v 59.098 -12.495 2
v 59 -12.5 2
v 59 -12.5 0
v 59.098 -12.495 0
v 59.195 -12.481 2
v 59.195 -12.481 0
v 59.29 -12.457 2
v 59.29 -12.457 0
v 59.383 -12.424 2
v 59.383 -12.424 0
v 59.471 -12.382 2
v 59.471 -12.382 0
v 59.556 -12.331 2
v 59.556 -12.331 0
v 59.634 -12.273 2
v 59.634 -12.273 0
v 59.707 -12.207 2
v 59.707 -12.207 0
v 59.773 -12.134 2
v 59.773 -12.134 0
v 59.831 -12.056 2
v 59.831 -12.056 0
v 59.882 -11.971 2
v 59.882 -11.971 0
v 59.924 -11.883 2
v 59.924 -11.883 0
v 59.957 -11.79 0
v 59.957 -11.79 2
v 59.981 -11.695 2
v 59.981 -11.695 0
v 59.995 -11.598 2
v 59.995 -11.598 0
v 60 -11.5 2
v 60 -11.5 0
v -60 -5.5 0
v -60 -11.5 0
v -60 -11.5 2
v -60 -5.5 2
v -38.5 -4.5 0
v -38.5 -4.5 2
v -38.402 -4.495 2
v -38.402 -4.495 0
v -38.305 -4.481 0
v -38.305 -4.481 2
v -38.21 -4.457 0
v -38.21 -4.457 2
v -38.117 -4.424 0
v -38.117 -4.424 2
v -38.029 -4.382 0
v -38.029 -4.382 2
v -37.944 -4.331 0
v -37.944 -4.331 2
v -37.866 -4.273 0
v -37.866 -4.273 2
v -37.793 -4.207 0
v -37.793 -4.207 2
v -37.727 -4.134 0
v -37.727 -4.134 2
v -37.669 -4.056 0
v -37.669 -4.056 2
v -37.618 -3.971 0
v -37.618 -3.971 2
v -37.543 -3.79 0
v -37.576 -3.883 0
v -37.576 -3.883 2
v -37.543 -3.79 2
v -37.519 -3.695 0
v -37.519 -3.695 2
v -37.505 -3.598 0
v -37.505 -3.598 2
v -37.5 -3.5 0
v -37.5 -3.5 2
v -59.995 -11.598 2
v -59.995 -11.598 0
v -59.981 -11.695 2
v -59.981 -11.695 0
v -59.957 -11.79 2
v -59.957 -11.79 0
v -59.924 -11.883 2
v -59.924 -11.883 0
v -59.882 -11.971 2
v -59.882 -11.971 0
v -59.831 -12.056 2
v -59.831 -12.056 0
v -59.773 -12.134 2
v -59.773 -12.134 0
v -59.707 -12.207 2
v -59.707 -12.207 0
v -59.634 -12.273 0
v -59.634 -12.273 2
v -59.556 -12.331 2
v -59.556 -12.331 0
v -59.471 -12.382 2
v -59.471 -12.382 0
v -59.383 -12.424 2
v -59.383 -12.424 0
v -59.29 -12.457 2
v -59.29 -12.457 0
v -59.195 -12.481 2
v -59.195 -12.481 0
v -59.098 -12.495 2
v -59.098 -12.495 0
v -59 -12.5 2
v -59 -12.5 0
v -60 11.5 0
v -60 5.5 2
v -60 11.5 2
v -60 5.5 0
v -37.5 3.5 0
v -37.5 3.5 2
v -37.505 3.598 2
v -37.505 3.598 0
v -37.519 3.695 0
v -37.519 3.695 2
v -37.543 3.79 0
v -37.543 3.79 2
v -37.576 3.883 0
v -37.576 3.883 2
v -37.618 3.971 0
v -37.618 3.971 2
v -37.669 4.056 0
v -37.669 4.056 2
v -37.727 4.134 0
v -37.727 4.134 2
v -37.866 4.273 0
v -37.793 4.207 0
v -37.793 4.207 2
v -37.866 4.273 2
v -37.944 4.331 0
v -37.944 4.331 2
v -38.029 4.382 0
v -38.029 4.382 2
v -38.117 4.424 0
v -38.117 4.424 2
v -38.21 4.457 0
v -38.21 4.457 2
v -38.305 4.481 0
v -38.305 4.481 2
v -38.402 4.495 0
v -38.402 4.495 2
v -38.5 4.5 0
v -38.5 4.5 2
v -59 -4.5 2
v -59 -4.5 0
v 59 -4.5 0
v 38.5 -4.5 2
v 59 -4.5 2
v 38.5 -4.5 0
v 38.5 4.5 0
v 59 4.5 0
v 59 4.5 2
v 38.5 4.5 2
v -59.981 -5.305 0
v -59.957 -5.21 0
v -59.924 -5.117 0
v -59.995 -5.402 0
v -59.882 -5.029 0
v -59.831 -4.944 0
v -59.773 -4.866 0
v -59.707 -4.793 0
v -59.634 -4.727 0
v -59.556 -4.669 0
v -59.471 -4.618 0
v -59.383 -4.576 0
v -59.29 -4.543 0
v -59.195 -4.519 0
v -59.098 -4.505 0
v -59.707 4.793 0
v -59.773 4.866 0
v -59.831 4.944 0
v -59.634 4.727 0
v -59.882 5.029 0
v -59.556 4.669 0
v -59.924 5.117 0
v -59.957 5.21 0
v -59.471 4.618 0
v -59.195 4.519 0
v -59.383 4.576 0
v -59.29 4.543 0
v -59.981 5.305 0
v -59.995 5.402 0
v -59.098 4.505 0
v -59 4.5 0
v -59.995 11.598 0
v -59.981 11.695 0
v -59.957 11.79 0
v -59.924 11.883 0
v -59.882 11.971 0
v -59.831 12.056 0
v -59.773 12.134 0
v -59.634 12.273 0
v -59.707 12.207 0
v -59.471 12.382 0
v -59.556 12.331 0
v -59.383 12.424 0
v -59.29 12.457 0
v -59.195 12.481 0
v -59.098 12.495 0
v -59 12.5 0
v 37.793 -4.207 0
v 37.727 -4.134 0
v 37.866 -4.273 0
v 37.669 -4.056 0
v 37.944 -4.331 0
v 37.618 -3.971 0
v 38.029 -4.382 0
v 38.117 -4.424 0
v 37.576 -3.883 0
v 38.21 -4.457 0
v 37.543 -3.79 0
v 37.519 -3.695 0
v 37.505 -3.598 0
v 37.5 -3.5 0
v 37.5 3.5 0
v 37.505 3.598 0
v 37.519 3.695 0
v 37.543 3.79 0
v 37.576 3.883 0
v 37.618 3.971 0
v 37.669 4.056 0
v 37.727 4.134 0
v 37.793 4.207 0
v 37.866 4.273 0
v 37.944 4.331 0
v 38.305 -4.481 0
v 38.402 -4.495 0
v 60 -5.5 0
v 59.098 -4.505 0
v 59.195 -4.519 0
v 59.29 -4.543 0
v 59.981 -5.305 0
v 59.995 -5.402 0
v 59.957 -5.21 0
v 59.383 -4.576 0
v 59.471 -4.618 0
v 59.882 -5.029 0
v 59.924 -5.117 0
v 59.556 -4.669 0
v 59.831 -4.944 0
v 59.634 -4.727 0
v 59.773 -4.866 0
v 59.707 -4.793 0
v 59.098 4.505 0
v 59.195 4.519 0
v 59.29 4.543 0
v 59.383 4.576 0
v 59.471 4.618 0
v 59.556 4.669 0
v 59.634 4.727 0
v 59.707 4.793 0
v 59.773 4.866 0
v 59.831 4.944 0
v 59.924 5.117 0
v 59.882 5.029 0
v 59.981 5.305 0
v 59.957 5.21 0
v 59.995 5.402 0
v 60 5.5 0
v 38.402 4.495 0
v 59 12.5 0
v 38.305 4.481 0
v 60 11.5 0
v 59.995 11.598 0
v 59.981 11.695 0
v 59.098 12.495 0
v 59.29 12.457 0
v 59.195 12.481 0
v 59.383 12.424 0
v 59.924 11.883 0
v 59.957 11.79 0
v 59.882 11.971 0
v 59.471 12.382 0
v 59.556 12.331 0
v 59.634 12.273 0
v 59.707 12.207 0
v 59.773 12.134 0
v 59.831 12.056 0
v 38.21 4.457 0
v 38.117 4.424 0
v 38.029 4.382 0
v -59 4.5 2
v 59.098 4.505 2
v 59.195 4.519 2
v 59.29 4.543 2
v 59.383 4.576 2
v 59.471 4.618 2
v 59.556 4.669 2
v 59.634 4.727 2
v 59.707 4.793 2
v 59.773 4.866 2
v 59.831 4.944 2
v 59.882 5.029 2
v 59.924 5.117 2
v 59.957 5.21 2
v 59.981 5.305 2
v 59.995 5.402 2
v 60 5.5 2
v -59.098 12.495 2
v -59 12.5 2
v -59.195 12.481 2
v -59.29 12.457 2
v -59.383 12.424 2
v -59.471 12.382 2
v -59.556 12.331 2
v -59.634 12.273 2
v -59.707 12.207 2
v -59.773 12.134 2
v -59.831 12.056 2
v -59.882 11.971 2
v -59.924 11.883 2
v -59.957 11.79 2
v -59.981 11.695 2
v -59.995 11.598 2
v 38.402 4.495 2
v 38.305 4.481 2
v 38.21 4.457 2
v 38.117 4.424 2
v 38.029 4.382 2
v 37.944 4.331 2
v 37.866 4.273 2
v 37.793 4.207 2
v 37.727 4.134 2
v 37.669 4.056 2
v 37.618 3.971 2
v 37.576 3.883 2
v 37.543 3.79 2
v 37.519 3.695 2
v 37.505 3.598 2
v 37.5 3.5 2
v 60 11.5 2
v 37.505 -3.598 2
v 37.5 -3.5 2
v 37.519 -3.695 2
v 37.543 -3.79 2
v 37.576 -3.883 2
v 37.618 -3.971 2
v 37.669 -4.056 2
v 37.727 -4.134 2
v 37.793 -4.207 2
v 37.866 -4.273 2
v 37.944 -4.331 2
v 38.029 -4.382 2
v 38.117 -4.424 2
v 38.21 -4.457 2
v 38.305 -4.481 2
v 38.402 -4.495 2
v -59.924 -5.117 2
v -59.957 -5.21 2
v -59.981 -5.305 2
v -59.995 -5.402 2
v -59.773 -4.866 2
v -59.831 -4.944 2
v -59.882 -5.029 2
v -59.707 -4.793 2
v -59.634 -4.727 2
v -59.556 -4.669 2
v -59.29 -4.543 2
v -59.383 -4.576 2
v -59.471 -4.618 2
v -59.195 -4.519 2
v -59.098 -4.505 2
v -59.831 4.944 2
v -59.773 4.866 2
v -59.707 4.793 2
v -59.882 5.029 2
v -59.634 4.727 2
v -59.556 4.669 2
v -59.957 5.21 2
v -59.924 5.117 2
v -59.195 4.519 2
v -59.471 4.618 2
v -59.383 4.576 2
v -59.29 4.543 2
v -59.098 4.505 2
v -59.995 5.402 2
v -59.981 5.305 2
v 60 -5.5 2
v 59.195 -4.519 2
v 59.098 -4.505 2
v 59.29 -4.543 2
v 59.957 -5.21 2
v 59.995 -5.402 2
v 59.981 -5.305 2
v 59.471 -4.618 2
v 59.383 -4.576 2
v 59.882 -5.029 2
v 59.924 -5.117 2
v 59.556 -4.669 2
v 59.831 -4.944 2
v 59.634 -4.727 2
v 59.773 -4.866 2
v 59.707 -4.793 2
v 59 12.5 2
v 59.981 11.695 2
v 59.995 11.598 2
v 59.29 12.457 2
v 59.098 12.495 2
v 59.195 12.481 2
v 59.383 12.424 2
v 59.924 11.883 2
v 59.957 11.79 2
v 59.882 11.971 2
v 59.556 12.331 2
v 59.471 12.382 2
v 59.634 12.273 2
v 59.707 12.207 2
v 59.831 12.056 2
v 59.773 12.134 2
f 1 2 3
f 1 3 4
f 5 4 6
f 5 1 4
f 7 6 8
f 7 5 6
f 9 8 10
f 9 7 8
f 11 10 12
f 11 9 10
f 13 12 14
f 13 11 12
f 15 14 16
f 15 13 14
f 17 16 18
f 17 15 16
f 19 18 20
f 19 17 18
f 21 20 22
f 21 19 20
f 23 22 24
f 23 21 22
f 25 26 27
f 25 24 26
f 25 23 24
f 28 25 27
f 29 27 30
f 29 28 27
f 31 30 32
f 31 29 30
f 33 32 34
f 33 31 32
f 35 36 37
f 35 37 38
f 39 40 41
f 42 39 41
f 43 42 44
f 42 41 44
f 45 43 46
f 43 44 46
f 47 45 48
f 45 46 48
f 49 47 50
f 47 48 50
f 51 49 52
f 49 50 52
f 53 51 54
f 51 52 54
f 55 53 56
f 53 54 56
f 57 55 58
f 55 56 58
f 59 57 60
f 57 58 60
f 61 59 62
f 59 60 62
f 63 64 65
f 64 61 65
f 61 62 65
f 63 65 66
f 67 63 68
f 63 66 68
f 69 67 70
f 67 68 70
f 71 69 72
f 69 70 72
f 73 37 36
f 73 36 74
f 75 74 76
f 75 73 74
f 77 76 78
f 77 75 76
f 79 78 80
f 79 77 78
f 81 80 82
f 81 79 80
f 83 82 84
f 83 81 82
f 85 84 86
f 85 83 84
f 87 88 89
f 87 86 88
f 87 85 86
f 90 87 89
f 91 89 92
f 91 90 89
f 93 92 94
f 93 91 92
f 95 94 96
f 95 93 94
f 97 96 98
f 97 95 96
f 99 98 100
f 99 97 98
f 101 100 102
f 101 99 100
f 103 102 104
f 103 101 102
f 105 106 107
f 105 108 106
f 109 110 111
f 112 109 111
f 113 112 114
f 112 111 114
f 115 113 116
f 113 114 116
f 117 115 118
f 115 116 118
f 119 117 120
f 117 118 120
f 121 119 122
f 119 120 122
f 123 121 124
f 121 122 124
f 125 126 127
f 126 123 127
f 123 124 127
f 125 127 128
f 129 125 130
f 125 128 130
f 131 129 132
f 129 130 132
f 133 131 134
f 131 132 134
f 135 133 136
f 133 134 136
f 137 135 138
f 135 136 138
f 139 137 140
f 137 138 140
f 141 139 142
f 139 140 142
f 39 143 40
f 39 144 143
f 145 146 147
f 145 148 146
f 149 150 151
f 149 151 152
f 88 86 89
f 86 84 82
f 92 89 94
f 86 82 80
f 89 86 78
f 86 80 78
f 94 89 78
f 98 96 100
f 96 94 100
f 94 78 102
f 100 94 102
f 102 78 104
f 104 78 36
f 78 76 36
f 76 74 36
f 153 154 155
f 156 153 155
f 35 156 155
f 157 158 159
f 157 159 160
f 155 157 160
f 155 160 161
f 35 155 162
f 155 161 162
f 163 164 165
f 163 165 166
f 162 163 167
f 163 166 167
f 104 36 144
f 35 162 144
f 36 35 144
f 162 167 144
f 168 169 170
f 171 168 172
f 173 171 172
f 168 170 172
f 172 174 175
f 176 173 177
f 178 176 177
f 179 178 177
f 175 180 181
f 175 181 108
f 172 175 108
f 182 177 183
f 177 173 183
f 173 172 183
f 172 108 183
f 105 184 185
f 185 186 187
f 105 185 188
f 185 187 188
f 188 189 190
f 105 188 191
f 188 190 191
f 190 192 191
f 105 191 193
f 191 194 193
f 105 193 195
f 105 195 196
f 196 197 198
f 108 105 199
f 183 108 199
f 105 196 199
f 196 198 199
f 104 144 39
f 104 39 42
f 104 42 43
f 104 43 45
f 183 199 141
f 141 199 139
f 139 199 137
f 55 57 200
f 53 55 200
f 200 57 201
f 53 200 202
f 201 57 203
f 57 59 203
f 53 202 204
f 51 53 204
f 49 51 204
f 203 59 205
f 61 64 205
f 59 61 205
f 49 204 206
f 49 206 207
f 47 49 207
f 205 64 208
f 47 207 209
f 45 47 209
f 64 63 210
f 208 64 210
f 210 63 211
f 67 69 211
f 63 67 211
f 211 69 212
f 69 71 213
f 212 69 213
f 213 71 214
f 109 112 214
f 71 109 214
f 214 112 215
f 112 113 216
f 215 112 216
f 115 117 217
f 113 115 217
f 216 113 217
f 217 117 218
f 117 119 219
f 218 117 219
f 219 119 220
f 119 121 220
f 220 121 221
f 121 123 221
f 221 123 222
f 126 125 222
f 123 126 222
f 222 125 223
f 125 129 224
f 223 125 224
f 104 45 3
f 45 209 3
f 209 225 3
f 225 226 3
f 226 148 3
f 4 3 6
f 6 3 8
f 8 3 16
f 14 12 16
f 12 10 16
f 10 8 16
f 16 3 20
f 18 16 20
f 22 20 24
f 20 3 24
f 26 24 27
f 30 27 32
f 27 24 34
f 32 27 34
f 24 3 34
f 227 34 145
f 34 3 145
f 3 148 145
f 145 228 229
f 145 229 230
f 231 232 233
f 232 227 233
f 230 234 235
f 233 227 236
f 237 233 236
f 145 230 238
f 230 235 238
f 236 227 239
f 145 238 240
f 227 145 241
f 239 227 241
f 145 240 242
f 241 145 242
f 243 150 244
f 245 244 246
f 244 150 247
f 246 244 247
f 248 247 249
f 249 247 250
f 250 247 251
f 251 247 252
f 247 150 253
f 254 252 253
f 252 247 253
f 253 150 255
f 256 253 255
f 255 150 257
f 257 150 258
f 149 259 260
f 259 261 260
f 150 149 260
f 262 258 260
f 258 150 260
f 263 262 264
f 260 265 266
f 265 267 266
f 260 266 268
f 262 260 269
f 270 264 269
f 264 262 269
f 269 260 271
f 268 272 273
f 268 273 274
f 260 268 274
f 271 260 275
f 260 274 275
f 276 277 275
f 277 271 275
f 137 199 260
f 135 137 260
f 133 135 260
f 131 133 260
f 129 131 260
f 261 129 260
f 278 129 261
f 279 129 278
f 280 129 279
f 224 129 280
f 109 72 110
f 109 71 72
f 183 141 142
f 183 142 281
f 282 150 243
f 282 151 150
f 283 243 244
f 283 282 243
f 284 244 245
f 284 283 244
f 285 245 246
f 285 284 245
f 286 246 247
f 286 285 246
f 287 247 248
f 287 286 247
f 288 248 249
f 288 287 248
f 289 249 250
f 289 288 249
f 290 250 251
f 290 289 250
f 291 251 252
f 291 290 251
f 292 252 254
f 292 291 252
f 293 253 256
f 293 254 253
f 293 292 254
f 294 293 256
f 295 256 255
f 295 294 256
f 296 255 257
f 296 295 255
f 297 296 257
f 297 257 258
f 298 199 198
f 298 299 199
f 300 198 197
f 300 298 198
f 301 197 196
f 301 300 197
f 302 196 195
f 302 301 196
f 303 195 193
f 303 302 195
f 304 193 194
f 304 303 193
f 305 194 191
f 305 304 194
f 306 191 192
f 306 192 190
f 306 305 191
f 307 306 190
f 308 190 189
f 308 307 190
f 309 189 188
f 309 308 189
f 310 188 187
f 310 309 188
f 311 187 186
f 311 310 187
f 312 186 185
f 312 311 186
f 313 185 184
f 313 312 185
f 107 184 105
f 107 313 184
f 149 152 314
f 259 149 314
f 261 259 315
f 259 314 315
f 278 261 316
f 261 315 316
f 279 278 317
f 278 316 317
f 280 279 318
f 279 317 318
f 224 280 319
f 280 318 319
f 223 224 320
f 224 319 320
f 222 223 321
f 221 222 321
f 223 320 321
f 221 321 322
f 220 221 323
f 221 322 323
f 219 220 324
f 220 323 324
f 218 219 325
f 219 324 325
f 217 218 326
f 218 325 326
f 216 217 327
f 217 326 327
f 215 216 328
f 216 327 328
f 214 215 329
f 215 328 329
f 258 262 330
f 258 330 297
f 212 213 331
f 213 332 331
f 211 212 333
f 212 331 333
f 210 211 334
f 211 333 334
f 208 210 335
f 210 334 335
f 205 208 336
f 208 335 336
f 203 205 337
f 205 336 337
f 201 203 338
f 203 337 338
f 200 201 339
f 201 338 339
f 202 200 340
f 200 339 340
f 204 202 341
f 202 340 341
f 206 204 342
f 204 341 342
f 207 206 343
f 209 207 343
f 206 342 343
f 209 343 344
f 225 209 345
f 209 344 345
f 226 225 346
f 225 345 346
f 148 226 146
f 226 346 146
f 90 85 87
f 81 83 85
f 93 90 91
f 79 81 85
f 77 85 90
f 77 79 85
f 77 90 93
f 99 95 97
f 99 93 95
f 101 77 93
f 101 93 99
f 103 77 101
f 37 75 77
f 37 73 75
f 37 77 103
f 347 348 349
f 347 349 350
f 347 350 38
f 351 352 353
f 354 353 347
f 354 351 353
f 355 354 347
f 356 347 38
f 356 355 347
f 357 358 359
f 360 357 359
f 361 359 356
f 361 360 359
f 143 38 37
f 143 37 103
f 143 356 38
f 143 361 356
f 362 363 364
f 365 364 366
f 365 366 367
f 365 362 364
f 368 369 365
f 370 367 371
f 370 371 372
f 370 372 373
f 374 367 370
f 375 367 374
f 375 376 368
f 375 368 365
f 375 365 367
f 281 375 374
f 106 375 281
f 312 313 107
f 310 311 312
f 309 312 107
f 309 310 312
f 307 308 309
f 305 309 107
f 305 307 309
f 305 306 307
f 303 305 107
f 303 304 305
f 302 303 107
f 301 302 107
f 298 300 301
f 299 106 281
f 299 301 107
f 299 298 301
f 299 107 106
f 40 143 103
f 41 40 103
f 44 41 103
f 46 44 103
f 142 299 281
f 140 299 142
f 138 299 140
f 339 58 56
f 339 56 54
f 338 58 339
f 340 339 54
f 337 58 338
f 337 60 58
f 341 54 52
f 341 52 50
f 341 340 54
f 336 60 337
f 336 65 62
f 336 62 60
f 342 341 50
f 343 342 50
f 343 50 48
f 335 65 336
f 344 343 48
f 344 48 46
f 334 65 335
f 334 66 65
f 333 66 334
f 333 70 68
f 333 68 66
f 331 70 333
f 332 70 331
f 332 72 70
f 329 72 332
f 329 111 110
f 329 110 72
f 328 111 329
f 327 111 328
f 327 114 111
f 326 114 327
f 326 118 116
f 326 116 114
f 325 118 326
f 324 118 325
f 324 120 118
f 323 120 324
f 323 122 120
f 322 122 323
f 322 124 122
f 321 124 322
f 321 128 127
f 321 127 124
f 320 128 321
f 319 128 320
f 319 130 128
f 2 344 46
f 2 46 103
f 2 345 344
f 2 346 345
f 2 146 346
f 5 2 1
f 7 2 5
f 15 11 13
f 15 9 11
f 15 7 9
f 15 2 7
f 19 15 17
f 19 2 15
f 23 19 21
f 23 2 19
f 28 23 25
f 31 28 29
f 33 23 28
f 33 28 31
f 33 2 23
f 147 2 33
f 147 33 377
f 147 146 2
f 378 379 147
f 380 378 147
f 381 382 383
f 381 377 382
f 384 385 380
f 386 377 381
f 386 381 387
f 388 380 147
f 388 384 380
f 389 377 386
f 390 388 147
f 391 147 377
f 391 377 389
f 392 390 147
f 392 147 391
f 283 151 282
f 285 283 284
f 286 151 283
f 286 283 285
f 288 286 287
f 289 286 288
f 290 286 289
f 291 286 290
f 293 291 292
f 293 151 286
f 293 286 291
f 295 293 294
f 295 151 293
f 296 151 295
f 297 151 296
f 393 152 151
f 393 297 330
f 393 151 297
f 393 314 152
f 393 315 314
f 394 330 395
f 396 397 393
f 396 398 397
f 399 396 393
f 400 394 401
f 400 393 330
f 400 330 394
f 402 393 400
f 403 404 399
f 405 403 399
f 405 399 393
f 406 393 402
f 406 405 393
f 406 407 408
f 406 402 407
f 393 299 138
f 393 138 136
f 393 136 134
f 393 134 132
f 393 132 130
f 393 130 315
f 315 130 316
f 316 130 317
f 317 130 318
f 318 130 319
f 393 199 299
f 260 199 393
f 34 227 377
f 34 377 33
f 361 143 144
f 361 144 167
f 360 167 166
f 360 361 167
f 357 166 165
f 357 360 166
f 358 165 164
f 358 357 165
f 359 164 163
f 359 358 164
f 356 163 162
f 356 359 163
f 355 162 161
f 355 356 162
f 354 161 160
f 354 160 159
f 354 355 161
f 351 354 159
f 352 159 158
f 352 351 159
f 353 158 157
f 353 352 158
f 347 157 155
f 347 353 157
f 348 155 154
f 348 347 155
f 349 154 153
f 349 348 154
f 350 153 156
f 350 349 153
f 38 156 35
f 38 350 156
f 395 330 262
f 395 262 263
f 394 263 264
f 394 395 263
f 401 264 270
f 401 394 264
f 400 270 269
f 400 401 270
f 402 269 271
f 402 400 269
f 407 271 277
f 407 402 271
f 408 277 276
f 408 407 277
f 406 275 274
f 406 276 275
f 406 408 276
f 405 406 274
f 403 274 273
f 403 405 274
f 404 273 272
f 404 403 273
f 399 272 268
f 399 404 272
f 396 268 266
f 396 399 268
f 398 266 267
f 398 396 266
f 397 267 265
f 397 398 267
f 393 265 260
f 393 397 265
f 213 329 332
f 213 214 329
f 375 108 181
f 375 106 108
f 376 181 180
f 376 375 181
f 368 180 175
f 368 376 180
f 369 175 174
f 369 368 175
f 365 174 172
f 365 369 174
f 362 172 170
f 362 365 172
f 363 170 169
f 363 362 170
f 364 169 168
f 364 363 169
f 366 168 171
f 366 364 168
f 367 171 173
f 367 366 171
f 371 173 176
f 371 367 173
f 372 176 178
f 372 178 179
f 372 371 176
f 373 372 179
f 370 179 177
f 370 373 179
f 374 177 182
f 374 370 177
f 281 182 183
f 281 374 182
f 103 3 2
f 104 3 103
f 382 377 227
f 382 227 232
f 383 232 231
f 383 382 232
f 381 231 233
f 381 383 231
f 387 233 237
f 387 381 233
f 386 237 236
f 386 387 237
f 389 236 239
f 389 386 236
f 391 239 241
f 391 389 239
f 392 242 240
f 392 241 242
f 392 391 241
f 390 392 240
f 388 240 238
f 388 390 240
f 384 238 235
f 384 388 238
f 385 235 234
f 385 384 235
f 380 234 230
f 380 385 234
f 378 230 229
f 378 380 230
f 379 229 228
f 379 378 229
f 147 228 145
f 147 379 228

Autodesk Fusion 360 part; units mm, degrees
sketch "Sketch1" plane through (0, 0, 0) normal (0, 0, 1) x (1, 0, 0)
  line L0 (-60, 12.5) -> (60, 12.5)
  line L1 (60, 12.5) -> (60, 4.5)
  line L2 (60, 4.5) -> (-60, 4.5)
  line L3 (-60, 4.5) -> (-60, 12.5)
  line L4 (-60, -4.5) -> (60, -4.5)
  line L5 (60, -4.5) -> (60, -12.5)
  line L6 (60, -12.5) -> (-60, -12.5)
  line L7 (-60, -12.5) -> (-60, -4.5)
  line L8 (-37.5, 4.5) -> (37.5, 4.5)
  line L9 (37.5, 4.5) -> (37.5, -4.5)
  line L10 (37.5, -4.5) -> (-37.5, -4.5)
  line L11 (-37.5, -4.5) -> (-37.5, 4.5)
  dimension "d24" = 120
  dimension "d25" = 8
  dimension "d26" = 8
  dimension "d27" = 25
  dimension "d28" = 75
  dimension "d34" = 60
  dimension "d35" = 12.5
  dimension "d38" = 37.5
extrude "Extrude1" add sketch "Sketch1" along normal blind 2
fillet "Fillet1" radius 1 12 edges at (-60, 12.5, 1) (-60, 4.5, 1) (-60, -4.5, 1) (-60, -12.5, 1) (-37.5, 4.5, 1) (-37.5, -4.5, 1) (60, -12.5, 1) (60, -4.5, 1) (37.5, 4.5, 1) (37.5, -4.5, 1) (60, 4.5, 1) (60, 12.5, 1)
equation "d26 = d25"
equation "d34 = d24 / 2"
equation "d35 = d27 / 2"
equation "d38 = d28 / 2"
